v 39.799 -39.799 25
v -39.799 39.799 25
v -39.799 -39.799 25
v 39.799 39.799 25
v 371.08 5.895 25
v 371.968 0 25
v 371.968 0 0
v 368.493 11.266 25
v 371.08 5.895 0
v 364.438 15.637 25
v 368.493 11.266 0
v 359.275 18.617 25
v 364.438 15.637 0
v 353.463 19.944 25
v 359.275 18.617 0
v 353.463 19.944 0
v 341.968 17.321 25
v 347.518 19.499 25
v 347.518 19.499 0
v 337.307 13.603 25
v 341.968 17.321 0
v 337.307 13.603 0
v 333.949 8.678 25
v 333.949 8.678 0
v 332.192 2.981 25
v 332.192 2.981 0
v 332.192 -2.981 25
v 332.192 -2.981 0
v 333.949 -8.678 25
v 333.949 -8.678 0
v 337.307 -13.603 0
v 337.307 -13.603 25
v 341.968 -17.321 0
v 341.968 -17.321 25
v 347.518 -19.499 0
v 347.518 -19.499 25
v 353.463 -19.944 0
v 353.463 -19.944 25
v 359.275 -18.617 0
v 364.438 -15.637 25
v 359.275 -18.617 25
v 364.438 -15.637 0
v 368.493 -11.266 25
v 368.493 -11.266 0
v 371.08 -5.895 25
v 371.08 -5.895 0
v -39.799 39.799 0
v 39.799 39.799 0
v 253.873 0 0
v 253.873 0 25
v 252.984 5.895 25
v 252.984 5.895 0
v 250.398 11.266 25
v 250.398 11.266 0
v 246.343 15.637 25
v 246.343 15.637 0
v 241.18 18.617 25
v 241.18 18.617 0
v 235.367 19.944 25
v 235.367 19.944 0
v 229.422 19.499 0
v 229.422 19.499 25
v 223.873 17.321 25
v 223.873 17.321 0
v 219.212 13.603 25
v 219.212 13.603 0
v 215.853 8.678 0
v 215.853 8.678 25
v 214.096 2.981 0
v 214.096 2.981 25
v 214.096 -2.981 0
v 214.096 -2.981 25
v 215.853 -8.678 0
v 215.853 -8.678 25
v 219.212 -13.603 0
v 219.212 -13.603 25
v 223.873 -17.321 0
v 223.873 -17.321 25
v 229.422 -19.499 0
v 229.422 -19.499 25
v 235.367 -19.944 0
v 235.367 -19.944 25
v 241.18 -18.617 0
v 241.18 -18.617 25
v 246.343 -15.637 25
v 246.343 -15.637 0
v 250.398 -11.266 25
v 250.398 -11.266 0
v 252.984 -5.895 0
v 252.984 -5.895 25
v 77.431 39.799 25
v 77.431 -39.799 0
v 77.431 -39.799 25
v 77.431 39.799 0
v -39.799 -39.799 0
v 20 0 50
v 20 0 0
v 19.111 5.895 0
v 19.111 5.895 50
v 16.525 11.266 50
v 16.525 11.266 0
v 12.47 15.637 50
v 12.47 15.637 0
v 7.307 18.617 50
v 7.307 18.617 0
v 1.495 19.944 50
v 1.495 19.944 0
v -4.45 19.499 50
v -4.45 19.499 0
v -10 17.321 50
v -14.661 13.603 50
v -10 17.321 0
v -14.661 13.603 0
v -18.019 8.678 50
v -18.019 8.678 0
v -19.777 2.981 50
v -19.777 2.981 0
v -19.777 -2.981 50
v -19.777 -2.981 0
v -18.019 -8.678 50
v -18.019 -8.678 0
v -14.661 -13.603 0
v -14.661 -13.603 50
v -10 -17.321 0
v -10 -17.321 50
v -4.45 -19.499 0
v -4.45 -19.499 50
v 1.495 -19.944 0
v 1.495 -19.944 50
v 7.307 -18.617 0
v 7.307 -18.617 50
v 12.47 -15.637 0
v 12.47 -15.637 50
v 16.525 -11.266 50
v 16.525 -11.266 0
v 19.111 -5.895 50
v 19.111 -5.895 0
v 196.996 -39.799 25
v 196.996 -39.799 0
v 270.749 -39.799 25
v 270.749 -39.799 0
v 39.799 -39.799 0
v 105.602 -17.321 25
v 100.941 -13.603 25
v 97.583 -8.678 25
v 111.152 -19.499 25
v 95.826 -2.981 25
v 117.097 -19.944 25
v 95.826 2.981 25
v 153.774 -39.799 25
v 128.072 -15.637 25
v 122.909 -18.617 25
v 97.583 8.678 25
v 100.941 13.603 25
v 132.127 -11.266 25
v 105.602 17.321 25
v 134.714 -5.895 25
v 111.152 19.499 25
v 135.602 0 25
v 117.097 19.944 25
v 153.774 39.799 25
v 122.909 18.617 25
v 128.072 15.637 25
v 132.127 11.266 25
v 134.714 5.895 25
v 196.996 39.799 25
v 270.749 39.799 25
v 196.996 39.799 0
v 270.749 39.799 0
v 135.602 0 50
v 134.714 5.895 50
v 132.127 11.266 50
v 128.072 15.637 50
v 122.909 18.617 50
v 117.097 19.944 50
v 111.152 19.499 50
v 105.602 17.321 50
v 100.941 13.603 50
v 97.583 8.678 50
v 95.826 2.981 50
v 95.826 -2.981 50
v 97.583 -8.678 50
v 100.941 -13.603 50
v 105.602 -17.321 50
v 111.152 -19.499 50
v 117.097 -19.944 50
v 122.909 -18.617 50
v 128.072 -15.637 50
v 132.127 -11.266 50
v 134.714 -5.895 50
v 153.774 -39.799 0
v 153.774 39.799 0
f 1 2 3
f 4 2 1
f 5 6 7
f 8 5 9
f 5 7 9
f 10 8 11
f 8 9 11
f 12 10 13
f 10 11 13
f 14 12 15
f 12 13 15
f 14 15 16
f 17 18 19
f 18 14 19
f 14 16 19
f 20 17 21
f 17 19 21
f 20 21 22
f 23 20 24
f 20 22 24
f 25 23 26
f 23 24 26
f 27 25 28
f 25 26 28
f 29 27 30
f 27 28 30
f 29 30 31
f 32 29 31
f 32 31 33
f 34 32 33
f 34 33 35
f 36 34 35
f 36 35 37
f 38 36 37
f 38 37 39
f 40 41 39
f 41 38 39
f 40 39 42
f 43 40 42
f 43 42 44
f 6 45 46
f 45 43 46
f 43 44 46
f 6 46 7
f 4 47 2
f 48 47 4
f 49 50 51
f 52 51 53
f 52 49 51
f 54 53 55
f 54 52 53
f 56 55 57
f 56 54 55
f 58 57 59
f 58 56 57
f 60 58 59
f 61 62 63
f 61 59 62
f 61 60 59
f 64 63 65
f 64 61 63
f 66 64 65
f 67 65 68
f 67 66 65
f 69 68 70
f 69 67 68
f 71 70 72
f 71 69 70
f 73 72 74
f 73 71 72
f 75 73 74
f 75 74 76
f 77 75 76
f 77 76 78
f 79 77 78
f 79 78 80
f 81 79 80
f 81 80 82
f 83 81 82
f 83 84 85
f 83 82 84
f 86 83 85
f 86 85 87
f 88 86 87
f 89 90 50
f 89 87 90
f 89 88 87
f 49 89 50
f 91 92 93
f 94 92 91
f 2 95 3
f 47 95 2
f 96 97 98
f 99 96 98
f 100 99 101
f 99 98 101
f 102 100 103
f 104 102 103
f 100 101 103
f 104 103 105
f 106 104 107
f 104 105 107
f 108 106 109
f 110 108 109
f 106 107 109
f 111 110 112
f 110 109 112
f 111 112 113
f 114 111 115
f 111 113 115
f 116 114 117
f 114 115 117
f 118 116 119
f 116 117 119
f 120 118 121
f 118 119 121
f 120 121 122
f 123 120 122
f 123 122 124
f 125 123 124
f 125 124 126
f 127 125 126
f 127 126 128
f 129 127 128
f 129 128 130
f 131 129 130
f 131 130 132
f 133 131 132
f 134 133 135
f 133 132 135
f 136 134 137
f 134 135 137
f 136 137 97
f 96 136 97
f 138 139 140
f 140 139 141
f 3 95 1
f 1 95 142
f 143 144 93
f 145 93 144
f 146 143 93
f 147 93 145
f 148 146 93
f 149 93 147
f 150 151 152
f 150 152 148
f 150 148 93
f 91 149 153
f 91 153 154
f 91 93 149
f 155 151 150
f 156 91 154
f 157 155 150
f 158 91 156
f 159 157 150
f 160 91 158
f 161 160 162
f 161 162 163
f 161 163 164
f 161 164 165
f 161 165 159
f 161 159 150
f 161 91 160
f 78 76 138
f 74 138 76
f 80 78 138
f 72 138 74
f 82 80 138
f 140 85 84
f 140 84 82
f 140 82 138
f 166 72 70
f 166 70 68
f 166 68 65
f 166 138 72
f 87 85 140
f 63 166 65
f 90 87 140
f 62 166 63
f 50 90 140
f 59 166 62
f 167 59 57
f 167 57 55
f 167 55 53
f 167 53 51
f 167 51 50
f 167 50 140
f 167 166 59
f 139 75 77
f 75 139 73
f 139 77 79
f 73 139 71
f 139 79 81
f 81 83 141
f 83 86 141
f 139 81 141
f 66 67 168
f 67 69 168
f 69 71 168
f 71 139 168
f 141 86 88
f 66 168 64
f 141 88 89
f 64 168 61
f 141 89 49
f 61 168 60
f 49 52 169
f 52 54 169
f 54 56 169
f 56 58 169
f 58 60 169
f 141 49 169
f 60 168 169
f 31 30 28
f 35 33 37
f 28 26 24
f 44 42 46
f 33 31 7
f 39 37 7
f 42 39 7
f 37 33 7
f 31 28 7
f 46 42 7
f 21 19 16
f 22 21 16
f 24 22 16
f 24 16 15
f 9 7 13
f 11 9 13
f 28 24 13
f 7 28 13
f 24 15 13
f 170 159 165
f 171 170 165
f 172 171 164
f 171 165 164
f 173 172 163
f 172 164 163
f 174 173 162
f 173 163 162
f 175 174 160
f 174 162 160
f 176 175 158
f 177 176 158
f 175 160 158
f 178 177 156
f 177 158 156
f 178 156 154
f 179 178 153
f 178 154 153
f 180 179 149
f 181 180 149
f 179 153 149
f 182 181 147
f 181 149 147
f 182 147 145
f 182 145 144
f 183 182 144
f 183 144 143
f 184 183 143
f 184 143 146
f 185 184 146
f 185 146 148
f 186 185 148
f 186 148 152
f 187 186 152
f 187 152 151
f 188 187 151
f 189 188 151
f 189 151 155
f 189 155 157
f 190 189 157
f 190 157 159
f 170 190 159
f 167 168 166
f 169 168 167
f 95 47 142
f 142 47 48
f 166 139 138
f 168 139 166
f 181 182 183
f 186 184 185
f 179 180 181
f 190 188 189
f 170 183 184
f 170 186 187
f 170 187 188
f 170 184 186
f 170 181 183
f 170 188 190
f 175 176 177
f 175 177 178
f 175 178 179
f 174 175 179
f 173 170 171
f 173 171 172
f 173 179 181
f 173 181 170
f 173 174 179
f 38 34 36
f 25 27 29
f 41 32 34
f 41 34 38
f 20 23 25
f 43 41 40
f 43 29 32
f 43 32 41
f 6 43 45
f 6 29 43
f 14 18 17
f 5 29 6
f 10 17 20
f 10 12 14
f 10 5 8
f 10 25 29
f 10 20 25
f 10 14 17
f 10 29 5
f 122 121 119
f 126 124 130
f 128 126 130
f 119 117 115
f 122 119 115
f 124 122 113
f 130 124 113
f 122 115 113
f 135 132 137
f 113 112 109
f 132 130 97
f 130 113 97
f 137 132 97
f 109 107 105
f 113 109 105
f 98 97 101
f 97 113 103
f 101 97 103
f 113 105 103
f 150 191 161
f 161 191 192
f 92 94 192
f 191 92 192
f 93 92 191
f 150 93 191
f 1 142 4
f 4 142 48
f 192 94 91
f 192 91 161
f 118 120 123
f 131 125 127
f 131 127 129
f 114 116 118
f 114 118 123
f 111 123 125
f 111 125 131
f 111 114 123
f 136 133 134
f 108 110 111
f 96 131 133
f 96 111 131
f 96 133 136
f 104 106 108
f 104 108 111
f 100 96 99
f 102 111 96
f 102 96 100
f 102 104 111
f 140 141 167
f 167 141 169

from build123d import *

# Parameters (mm, degrees)
F0_W     = 79.5980393887
F0_H     = 79.5980393887
F1_DEPTH = 25
F0_W_2   = 76.3423591852
F0_W_3   = 73.753029108
F0_W_4   = 83.3638906479
F2_R     = 20
F3_DEPTH = 50
F4_DEPTH = 50
F5_DEPTH = 50
F6_DEPTH = 50


with BuildPart() as f1:
    # F0 (on Top) → F1 (new body)
    with BuildSketch(Plane.XY):
        Rectangle(F0_W, F0_H)
    extrude(amount=F1_DEPTH)


with BuildPart() as f1b:
    # F0 (on Top) → F1, piece 2 (new body)
    with BuildSketch(Plane.XY):
        with Locations((115.6024113297, 0)):
            Rectangle(F0_W_2, F0_H)
    extrude(amount=F1_DEPTH)

    # F2 (on Top) → F4 (join)
    with BuildSketch(Plane.XY):
        with Locations((115.6024113297, 0)):
            Circle(F2_R)
    extrude(amount=F4_DEPTH)


with BuildPart() as f1c:
    # F0 (on Top) → F1, piece 3 (new body)
    with BuildSketch(Plane.XY):
        with Locations((233.8728457689, 0)):
            Rectangle(F0_W_3, F0_H)
    extrude(amount=F1_DEPTH)

    # F2 (on Top) → F5 (cut)
    with BuildSketch(Plane.XY):
        with Locations((233.8728457689, 0)):
            Circle(F2_R)
    extrude(amount=F5_DEPTH, mode=Mode.SUBTRACT)


with BuildPart() as f1d:
    # F0 (on Top) → F1, piece 4 (new body)
    with BuildSketch(Plane.XY):
        with Locations((351.96813941, 0)):
            Rectangle(F0_W_4, F0_H)
    extrude(amount=F1_DEPTH)

    # F2 (on Top) → F6 (intersect)
    with BuildSketch(Plane.XY):
        with Locations((351.96813941, 0)):
            Circle(F2_R)
    extrude(amount=F6_DEPTH, mode=Mode.INTERSECT)


with BuildPart() as f3:
    # F2 (on Top) → F3 (new body)
    with BuildSketch(Plane.XY):
        Circle(F2_R)
    extrude(amount=F3_DEPTH)


solid = Compound([f1.part, f1b.part, f1c.part, f1d.part, f3.part])
